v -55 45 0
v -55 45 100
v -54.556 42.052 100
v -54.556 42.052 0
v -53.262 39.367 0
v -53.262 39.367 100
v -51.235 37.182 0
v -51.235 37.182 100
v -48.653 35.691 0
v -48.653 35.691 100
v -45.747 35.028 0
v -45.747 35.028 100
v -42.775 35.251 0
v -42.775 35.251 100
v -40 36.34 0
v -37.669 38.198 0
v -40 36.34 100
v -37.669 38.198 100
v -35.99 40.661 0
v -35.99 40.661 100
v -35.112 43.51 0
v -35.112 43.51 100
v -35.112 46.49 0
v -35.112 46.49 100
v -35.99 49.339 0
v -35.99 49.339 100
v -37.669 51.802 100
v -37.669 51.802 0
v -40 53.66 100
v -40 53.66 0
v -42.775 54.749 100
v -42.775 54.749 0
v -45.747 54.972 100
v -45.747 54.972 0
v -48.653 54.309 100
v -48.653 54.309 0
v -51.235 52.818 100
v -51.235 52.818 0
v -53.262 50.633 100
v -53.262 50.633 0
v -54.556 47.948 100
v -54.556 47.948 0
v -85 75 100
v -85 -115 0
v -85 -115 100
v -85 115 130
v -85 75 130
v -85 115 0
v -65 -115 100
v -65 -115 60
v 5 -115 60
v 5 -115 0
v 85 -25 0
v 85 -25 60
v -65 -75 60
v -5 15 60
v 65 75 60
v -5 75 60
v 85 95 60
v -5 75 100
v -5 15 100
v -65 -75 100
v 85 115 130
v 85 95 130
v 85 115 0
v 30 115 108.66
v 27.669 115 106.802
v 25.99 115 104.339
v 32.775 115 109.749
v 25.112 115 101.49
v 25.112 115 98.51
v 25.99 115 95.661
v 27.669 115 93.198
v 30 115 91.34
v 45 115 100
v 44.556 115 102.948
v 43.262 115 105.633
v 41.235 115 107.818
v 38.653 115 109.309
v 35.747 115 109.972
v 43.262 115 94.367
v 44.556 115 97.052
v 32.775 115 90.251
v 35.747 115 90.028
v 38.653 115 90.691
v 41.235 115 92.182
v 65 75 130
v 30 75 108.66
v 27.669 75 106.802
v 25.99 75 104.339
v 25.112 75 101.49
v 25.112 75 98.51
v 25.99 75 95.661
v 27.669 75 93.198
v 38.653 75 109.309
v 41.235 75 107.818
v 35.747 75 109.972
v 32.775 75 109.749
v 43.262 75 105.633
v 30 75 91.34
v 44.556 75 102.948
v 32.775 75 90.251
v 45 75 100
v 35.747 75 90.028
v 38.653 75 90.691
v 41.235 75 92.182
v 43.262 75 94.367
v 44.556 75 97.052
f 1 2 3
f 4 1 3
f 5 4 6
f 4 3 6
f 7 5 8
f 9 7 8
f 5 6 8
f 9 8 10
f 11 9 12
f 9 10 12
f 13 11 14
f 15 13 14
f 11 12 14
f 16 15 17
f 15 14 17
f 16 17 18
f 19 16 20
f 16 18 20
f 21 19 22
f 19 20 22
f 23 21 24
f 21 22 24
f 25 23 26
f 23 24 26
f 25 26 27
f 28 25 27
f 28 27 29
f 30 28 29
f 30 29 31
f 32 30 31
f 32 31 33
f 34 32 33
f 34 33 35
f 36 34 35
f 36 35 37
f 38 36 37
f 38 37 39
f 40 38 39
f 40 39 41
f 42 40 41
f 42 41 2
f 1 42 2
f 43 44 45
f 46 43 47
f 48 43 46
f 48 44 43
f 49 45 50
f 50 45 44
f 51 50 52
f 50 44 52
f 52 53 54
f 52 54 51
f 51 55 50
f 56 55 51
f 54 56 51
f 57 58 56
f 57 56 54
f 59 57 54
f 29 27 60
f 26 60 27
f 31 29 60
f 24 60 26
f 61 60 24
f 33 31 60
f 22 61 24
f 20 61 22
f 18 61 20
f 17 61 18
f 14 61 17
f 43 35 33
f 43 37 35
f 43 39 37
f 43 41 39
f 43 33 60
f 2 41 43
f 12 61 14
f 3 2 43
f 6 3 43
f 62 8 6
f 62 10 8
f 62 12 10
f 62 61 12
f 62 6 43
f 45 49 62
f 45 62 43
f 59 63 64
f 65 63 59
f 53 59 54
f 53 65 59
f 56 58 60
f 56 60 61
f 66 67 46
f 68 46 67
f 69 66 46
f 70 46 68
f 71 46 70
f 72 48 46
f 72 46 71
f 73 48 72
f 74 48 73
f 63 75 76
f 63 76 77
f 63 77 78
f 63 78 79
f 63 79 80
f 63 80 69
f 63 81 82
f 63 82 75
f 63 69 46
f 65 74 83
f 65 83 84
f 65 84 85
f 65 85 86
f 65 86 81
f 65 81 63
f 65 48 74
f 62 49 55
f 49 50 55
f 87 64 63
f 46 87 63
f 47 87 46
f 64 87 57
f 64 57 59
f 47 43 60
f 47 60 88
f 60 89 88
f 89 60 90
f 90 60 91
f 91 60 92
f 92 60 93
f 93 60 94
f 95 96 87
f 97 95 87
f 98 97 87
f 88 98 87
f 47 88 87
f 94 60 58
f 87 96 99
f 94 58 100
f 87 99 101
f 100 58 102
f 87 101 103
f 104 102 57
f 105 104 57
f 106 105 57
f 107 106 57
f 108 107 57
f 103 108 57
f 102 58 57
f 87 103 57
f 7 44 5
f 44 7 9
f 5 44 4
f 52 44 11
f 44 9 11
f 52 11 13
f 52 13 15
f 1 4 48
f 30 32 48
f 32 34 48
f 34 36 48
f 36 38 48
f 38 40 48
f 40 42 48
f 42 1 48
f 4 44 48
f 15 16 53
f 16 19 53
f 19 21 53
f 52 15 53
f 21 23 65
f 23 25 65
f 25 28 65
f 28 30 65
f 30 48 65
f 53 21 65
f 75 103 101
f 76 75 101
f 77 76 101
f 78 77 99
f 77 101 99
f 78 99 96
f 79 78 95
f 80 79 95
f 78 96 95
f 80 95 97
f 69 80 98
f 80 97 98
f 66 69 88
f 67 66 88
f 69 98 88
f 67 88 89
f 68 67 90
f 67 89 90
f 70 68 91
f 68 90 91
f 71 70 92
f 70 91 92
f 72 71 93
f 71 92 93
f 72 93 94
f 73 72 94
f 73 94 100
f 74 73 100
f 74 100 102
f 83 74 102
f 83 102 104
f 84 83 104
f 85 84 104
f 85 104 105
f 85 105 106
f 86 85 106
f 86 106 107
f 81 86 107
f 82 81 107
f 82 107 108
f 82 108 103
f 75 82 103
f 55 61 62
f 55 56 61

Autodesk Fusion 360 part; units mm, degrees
sketch "Sketch1" plane through (0, 0, 0) normal (0, 0, 1) x (1, 0, 0) in component "Base"
  line L0 (-85, -115) -> (-85, 115)
  line L1 (-85, 115) -> (85, 115)
  line L2 (85, -115) -> (-85, 115) construction
  line L3 (-85, -115) -> (85, 115) construction
  line L4 (-85, -115) -> (-85, 115)
  line L5 (85, 115) -> (85, -25)
  line L6 (-85, -115) -> (5, -115)
  line L7 (85, -25) -> (5, -115)
  dimension "d1" = 170
  dimension "d2" = 230
  dimension "d3" = 140
  dimension "d4" = 90
extrude "Extrude1" add sketch "Sketch1" along normal blind 60 in component "Base"
sketch "Sketch2" plane through (0, 0, 60) normal (0, 0, 1) x (-1, 0, 0) in component "Base"
  line L0 (85, 115) -> (-5, 115)
  line L1 (-5, 115) -> (-85, 25)
  line L2 (-85, 25) -> (-85, -115)
  line L3 (-85, -115) -> (85, -115)
  line L4 (85, -115) -> (85, 115)
  line L5 (-85, -115) -> (-85, -95)
  line L6 (85, -115) -> (85, -75)
  line L7 (85, -75) -> (-65, -75)
  line L8 (-65, -75) -> (-85, -95)
  dimension "d7" = 20
  dimension "d8" = 40
  dimension "d9" = 150
extrude "Extrude2" add sketch "Sketch2" along normal blind 70 contours L2 L3 L4 L5 L6 L7 L8 in component "Base"
sketch "Sketch3" plane through (0, 0, 60) normal (0, 0, 1) x (-1, 0, 0) in component "Base"
  line L0 (-65, -75) -> (85, -75)
  line L1 (85, -75) -> (85, 115)
  line L2 (85, 115) -> (-5, 115)
  line L3 (-5, 115) -> (-85, 25)
  line L4 (-85, 25) -> (-85, -95)
  line L5 (-85, -95) -> (-65, -75)
  line L6 (85, -75) -> (85, 115)
  line L7 (85, 115) -> (65, 115)
  line L8 (65, 115) -> (65, 75)
  line L9 (85, -75) -> (5, -75)
  line L10 (5, -75) -> (5, -15)
  line L11 (5, -15) -> (65, 75)
  dimension "d12" = 20
  dimension "d13" = 40
  dimension "d14" = 80
  dimension "d15" = 60
extrude "Extrude3" add sketch "Sketch3" along normal blind 40 contours L0 L1 L2 L6 L7 L8 L9 L10 L11 in component "Base"
sketch "Sketch4" plane through (0, 75, 0) normal (0, -1, 0) x (1, 0, 0) in component "Base"
  line L0 (-5, 100) -> (-5, 60)
  line L1 (-5, 60) -> (65, 60)
  line L2 (65, 60) -> (65, 130)
  line L3 (65, 130) -> (-85, 130)
  line L4 (-85, 130) -> (-85, 100)
  line L5 (-85, 100) -> (-5, 100)
  line L6 (65, 130) -> (25, 130)
  line L7 (65, 130) -> (35, 130)
  line L8 (65, 130) -> (65, 100)
  circle A0 centre (35, 100) radius 10
  dimension "d19" = 30
extrude "Extrude4" cut sketch "Sketch4" against normal up to surface (40 mm away) contours A0 in component "Base"
sketch "Sketch5" plane through (0, 0, 100) normal (0, 0, 1) x (-1, 0, 0) in component "Base"
  line L0 (85, -75) -> (85, 115)
  line L1 (85, 115) -> (65, 115)
  line L2 (65, 115) -> (65, 75)
  line L3 (65, 75) -> (5, -15)
  line L4 (5, -15) -> (5, -75)
  line L5 (5, -75) -> (85, -75)
  line L6 (85, -75) -> (45, -75)
  line L7 (85, -75) -> (85, -45)
  circle A0 centre (45, -45) radius 10
  dimension "d22" = 30
  dimension "d23" = 20
extrude "Extrude5" cut sketch "Sketch5" against normal up to surface (100 mm away) contours A0 in component "Base"
component "Base" placed x (1, 0, 0) y (0, 1, 0) z (0, 0, 1) at (0, 0, 0)
